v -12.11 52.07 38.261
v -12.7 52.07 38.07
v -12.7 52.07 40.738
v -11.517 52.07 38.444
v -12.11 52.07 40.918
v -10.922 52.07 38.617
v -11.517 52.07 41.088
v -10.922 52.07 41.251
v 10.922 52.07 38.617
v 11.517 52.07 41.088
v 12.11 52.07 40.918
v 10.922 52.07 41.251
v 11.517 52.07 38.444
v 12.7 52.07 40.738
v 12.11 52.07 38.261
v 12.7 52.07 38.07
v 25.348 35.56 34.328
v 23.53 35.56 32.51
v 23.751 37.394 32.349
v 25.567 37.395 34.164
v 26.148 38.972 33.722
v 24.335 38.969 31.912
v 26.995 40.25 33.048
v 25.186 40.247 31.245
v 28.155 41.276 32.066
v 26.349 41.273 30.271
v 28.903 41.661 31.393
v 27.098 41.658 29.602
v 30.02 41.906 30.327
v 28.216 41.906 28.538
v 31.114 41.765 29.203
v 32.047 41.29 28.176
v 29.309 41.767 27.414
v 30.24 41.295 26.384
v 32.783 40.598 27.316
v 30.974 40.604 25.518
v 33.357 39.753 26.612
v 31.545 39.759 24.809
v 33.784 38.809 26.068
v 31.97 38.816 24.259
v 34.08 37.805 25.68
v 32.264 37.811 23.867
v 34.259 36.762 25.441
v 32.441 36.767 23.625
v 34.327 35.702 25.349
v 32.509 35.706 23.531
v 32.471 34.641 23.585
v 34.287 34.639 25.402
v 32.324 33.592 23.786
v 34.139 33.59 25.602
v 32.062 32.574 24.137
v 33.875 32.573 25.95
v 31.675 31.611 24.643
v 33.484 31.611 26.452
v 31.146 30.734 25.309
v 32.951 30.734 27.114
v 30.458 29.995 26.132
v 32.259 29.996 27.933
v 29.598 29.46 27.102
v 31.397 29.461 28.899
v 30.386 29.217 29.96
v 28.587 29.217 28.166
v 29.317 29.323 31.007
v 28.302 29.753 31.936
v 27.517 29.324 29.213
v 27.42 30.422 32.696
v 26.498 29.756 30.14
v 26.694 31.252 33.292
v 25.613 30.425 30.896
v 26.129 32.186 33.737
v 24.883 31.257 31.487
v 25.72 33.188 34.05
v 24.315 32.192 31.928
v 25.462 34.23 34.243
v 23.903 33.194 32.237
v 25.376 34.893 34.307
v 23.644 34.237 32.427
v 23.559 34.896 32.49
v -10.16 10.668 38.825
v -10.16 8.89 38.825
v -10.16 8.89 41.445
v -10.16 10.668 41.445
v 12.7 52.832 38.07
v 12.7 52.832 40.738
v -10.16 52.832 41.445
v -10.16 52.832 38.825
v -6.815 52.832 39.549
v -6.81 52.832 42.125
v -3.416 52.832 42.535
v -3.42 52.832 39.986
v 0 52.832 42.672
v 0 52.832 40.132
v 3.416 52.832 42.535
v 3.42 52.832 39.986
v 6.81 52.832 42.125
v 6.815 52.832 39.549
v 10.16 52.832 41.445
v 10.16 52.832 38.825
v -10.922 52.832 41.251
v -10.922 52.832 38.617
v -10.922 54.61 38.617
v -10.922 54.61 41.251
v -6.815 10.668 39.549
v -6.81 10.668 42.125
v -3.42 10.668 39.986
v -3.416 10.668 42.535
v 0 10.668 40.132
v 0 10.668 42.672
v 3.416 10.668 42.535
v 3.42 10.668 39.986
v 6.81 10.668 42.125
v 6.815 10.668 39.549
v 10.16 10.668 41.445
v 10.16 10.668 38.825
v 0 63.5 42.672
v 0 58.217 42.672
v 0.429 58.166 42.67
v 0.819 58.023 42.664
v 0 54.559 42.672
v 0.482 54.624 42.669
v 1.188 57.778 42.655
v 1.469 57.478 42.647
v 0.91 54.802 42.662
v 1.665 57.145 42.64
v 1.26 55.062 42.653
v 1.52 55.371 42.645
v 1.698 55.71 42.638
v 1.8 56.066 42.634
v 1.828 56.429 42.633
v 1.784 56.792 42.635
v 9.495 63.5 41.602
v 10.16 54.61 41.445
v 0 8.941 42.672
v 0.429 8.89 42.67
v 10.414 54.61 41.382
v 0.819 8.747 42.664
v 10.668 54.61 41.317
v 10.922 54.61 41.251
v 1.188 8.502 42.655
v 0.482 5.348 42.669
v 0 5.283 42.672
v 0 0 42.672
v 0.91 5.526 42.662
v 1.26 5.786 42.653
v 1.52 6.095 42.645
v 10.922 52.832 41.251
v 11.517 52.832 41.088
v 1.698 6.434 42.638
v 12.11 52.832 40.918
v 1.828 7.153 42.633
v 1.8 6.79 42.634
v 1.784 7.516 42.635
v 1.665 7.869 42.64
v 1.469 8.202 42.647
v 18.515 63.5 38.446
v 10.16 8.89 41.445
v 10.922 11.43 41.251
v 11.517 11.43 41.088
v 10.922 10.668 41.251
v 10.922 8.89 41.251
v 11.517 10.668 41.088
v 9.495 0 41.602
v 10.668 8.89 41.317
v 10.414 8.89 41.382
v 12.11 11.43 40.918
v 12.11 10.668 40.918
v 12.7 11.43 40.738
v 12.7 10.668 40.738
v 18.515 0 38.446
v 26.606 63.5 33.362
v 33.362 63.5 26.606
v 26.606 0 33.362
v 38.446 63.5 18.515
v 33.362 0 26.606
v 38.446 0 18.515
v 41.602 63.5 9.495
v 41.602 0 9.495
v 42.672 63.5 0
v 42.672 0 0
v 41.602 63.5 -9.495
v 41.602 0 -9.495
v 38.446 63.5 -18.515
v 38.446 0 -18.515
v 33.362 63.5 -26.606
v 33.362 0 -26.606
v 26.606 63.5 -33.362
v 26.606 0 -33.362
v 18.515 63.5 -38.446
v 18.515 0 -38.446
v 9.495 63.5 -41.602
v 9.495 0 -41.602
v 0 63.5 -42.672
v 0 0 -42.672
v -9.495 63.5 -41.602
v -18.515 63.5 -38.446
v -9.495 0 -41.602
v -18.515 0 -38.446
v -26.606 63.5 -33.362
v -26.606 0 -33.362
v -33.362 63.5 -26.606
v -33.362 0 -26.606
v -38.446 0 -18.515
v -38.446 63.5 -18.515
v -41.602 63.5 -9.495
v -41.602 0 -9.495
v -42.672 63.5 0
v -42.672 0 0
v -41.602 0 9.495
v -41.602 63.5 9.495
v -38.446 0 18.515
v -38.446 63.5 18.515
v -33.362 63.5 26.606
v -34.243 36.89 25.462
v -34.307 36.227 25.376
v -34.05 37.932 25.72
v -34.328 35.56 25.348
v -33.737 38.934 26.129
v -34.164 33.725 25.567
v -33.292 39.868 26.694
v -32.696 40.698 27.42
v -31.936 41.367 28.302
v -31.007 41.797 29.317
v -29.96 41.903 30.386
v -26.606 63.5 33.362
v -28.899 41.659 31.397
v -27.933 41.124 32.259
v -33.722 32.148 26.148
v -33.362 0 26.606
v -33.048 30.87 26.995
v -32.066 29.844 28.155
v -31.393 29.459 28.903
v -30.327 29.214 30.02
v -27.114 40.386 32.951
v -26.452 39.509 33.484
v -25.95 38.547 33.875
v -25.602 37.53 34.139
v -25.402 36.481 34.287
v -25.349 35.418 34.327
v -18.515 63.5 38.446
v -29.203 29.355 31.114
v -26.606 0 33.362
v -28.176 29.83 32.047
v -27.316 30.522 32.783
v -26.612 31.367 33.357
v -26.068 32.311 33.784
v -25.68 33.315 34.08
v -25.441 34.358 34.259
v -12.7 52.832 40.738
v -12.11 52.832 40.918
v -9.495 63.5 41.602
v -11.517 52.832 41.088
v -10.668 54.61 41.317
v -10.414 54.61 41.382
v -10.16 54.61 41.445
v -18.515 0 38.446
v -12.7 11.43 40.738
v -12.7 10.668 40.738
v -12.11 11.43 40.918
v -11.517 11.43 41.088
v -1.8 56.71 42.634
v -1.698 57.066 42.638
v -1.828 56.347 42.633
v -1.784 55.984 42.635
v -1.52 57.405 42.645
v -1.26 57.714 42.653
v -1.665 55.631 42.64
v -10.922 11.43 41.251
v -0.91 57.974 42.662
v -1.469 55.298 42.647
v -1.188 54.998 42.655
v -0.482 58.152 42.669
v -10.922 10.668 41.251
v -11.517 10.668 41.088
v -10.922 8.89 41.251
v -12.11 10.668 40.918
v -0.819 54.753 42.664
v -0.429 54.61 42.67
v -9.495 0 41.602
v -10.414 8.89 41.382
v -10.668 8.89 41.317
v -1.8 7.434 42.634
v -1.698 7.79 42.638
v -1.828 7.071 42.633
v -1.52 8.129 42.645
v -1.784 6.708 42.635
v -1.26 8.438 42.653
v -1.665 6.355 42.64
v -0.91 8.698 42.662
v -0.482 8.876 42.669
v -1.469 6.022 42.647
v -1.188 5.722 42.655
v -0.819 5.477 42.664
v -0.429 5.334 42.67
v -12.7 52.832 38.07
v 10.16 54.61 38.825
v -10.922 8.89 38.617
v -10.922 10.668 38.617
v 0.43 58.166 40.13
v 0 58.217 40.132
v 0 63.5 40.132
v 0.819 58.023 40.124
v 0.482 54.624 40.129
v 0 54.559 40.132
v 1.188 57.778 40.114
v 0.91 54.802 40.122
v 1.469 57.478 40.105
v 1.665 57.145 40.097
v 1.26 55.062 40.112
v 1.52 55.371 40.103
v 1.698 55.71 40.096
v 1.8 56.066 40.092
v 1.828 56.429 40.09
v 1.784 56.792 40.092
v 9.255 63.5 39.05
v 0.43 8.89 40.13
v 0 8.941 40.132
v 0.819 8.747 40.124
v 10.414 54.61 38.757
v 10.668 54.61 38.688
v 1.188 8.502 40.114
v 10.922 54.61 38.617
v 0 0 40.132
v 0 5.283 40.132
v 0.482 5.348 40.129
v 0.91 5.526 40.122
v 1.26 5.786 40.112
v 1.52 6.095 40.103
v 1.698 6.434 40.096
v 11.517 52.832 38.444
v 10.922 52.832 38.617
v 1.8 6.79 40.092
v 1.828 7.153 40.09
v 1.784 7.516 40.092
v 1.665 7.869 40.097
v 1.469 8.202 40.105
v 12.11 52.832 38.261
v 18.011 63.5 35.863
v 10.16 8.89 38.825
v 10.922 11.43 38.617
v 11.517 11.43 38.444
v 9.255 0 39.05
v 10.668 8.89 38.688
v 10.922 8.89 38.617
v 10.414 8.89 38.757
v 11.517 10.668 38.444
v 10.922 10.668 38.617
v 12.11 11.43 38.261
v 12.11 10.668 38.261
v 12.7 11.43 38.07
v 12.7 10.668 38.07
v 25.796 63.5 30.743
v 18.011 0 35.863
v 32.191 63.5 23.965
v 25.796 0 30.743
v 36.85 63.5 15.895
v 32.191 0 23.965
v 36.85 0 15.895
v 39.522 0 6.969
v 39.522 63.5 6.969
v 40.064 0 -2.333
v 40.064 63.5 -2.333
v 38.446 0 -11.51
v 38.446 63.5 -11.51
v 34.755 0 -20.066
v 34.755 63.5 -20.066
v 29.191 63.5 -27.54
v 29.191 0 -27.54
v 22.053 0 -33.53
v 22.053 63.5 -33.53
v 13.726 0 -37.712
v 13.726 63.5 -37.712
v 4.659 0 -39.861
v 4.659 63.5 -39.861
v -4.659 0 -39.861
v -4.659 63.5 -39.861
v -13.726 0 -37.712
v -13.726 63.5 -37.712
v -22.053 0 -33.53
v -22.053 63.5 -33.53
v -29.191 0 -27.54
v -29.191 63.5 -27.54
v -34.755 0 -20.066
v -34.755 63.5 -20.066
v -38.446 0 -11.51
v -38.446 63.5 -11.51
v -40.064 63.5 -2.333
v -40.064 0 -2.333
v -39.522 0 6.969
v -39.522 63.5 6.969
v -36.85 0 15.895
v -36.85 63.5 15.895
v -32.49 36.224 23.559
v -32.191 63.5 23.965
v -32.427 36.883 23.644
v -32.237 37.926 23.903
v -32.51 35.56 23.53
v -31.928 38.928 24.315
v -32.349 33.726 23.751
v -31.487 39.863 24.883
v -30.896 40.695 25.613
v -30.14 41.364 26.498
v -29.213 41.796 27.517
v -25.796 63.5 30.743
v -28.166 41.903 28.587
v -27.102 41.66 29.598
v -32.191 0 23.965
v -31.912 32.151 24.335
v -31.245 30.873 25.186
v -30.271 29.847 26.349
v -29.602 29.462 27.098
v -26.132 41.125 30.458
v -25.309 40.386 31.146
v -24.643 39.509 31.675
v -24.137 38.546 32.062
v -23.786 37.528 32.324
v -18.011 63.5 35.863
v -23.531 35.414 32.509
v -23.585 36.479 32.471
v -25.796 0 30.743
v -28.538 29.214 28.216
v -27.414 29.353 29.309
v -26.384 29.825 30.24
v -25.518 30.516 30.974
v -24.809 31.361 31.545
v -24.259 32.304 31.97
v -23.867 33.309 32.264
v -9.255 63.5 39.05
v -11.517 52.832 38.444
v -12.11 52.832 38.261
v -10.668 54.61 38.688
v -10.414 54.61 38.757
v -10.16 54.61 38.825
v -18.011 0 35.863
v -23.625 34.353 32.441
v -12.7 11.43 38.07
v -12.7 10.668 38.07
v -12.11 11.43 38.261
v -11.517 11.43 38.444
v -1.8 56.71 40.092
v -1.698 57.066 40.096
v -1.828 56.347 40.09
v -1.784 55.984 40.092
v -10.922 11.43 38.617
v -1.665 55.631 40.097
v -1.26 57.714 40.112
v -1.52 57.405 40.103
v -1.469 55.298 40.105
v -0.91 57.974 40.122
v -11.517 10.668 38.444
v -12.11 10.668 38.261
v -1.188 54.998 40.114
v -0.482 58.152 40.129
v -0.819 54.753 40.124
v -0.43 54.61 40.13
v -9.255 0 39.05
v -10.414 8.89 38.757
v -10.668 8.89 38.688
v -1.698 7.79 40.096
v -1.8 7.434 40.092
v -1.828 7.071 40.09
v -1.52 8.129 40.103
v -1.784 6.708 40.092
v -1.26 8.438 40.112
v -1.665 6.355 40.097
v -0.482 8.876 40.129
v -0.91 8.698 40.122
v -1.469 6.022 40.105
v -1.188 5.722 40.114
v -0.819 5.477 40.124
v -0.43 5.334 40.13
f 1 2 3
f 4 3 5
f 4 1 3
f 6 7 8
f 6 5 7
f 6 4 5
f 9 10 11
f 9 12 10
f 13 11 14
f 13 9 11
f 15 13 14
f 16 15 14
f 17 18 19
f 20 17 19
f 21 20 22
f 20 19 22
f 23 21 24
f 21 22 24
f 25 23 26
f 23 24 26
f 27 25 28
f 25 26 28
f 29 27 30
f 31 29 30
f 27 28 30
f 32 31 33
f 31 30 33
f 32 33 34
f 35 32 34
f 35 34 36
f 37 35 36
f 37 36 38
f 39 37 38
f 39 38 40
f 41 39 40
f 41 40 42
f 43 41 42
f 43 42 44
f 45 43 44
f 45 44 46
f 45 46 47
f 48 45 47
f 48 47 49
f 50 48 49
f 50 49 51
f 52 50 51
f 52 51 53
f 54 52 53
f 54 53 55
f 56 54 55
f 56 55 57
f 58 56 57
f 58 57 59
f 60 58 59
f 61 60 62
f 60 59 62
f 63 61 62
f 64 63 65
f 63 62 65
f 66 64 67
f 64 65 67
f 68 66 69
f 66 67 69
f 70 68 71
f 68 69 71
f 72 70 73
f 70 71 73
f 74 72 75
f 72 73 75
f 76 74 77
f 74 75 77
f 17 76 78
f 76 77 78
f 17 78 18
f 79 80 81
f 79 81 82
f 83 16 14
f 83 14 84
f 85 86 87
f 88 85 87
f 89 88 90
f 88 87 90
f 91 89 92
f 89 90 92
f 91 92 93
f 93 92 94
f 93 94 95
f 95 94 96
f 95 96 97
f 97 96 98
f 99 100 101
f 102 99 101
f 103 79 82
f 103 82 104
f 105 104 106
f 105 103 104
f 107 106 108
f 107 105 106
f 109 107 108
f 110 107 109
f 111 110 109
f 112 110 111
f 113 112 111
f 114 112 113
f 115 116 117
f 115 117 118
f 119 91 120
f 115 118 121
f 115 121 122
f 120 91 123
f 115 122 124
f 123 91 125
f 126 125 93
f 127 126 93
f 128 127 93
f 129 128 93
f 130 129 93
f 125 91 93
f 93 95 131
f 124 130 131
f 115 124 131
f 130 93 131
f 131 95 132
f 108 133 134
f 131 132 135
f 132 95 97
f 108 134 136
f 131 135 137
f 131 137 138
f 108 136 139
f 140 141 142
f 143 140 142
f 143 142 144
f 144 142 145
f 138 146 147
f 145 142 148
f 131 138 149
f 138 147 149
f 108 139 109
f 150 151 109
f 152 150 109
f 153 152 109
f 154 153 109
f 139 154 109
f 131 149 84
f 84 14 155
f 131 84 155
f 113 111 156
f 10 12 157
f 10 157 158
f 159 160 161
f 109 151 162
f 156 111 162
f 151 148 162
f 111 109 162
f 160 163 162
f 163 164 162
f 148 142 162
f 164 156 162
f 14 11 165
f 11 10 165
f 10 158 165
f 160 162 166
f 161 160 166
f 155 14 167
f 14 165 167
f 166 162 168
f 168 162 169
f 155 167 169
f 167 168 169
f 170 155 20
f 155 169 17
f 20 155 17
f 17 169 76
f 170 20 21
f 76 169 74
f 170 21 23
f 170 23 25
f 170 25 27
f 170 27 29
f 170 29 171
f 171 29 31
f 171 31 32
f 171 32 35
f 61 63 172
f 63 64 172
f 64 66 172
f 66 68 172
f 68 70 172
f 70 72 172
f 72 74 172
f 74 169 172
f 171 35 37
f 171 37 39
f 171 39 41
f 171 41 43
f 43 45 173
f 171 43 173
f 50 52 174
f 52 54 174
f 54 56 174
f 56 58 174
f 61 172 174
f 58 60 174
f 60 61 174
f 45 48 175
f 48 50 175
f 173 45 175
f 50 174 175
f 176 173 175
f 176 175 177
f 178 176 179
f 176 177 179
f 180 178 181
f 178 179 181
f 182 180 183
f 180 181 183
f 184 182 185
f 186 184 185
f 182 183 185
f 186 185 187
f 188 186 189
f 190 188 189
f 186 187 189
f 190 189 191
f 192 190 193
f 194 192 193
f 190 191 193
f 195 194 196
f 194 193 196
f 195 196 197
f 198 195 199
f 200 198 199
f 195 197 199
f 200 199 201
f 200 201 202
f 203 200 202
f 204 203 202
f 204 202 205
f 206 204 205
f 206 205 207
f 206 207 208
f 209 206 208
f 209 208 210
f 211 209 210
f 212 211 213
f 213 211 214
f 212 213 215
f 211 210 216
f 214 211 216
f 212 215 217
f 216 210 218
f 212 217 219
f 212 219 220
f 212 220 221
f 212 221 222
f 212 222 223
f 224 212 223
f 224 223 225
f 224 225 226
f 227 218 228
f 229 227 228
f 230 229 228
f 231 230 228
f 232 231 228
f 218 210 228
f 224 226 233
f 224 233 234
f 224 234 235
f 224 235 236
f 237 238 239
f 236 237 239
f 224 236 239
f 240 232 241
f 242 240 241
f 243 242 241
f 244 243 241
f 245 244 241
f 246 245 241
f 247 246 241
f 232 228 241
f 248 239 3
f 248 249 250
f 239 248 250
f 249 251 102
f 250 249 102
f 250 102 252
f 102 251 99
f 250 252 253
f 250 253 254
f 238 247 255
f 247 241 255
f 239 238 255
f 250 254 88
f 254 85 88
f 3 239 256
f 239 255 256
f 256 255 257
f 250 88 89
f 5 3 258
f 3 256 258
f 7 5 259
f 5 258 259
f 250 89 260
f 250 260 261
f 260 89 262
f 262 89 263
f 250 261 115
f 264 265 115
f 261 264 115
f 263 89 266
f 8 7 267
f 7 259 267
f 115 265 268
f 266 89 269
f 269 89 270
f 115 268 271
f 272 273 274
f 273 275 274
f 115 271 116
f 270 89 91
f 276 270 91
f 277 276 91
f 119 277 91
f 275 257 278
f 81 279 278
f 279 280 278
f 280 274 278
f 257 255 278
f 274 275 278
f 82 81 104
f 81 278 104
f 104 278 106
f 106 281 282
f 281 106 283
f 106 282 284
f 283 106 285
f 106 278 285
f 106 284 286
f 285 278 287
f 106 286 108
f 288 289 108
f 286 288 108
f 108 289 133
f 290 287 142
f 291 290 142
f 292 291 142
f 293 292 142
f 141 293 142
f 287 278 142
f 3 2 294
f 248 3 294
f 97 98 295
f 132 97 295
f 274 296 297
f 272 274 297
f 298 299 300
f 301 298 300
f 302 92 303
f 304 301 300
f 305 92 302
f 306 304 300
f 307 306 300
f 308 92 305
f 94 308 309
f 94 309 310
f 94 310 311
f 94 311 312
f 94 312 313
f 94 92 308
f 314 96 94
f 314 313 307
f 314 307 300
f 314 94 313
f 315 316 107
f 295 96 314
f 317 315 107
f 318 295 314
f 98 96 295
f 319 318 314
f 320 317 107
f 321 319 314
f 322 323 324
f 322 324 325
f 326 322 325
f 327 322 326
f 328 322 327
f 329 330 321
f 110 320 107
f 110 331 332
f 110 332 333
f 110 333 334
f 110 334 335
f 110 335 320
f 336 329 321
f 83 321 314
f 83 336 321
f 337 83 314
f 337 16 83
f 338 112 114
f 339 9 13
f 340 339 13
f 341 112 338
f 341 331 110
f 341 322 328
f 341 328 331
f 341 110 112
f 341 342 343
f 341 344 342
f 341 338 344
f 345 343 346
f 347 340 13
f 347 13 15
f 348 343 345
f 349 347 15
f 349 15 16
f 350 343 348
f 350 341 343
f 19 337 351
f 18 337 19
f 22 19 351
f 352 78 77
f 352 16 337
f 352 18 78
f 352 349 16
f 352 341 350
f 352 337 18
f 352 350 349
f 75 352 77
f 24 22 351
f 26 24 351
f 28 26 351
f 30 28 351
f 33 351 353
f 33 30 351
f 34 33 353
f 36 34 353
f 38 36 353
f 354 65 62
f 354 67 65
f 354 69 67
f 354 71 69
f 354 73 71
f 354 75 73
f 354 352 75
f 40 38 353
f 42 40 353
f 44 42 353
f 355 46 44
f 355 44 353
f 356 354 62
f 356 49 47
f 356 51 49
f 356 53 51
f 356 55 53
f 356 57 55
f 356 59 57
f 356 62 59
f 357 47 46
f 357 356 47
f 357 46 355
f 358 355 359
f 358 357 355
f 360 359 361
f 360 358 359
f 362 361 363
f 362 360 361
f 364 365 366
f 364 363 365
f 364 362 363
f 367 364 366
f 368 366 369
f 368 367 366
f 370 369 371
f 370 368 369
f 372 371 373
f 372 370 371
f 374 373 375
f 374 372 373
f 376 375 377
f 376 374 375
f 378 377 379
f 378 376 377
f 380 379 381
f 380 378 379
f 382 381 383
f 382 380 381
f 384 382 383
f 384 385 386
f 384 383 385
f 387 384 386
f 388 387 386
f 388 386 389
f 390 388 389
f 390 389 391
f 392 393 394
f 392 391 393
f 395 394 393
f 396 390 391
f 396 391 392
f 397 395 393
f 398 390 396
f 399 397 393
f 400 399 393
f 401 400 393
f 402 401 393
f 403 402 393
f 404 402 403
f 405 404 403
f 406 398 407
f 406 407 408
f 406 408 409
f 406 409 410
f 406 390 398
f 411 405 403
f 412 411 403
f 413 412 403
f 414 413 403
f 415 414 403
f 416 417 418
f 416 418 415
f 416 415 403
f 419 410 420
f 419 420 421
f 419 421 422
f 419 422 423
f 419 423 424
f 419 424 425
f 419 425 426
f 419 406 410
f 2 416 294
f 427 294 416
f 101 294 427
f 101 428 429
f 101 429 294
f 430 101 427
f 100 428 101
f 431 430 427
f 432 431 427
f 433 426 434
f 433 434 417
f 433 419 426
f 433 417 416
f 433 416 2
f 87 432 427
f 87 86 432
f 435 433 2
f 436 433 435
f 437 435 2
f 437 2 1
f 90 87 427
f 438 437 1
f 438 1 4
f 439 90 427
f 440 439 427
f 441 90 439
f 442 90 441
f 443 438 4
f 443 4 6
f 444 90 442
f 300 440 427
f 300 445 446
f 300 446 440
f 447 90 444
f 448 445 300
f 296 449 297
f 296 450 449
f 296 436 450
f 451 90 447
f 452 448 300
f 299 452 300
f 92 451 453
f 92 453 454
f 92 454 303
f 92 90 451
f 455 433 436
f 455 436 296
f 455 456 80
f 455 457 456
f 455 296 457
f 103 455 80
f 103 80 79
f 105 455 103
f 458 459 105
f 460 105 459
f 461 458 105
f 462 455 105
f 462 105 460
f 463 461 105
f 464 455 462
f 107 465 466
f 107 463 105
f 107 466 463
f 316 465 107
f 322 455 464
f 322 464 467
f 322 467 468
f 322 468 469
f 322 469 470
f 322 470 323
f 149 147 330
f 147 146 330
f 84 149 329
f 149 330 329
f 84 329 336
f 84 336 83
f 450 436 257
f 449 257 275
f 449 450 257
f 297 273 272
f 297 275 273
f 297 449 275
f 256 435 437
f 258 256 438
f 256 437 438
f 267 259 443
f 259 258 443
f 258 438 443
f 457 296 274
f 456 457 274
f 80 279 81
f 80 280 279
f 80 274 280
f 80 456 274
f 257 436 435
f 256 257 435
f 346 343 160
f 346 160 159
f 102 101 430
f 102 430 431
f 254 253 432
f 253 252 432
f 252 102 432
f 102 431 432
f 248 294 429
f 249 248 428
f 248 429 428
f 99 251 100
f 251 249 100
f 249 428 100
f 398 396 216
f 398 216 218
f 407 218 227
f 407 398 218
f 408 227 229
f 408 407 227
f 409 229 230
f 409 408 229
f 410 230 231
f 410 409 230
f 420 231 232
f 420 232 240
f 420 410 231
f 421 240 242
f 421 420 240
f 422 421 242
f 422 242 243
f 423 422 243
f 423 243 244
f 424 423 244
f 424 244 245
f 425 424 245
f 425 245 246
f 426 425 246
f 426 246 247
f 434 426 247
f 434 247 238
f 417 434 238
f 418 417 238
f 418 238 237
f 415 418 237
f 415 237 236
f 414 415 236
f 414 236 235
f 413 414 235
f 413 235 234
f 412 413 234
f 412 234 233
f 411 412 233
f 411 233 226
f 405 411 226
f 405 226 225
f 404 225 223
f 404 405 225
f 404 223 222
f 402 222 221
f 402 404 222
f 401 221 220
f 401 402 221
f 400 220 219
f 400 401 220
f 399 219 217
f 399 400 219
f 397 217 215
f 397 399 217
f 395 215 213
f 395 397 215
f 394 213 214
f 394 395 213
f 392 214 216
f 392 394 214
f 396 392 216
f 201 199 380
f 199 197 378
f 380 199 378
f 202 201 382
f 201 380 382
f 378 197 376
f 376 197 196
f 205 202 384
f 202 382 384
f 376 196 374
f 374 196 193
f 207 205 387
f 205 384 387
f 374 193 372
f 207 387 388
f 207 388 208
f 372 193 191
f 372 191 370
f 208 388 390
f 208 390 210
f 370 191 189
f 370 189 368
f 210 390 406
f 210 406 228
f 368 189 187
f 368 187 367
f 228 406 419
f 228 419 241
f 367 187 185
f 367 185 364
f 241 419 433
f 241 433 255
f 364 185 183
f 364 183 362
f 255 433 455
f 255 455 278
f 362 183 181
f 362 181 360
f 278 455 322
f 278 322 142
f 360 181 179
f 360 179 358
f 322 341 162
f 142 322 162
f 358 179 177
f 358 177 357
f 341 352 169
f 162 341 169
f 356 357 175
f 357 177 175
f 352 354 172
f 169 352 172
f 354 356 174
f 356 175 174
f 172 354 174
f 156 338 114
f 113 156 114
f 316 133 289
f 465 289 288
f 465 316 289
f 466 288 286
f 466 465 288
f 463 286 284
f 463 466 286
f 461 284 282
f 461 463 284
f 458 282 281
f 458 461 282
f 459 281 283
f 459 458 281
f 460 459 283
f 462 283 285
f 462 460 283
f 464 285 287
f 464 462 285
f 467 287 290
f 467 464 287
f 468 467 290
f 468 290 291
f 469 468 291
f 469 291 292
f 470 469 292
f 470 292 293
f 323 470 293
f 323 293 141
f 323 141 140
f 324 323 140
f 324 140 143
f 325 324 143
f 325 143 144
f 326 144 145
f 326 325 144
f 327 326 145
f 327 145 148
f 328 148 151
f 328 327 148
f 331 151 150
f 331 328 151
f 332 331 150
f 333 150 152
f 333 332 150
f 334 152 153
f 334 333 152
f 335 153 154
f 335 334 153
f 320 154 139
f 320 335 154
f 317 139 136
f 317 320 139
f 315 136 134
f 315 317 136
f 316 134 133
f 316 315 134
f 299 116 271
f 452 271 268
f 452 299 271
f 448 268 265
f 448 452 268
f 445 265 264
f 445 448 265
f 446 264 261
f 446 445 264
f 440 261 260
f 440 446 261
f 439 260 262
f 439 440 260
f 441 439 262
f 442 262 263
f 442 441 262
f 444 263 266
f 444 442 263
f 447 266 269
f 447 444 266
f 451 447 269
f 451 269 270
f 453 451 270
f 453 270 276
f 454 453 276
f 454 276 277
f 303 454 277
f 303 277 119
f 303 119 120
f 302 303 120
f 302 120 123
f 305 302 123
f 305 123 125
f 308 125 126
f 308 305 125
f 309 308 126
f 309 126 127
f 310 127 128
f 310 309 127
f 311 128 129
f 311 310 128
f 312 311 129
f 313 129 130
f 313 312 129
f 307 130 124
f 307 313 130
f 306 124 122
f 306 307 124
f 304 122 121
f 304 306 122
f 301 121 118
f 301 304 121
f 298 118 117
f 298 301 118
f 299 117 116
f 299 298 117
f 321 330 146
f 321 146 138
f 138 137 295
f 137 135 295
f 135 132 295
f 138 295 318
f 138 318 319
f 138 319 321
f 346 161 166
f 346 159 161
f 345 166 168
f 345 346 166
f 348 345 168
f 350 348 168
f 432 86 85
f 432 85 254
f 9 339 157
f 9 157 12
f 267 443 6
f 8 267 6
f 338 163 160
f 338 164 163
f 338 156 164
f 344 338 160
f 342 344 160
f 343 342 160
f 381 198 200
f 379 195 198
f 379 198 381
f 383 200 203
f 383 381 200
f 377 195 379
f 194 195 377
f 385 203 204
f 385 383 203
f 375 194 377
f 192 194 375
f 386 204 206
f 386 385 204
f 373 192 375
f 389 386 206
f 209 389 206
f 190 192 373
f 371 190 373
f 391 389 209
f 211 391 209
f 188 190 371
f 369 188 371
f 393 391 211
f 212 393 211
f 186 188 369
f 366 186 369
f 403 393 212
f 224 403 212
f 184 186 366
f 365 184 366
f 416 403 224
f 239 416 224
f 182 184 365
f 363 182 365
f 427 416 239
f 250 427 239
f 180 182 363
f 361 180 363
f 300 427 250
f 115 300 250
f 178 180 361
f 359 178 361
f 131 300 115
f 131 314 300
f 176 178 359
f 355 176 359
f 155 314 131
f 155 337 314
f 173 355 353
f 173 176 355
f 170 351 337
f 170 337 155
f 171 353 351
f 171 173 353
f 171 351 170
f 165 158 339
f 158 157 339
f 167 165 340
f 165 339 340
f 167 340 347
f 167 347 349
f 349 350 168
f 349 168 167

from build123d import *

# Parameters (mm, degrees)
SKETCH1_R           = 42.672
BOSS_EXTRUDE1_DEPTH = 63.5
SKETCH2_R           = 40.132
CUT_EXTRUDE1_DEPTH  = 88.601650487
SKETCH3_R           = 1.8288
CUT_EXTRUDE2_DEPTH  = 88.601650487
SKETCH4_R           = 6.35
CUT_EXTRUDE3_DEPTH  = 88.601650665
SKETCH5_R           = 6.35
CUT_EXTRUDE4_DEPTH  = 88.601650665


with BuildPart() as part:
    # Sketch1 → Boss-Extrude1 (new body)
    with BuildSketch(Plane(origin=(0, 0, 0), x_dir=(1, 0, 0), z_dir=(0, 1, 0))):
        Circle(SKETCH1_R)
    extrude(amount=BOSS_EXTRUDE1_DEPTH)

    # Sketch2 → Cut-Extrude1 (cut, through all)
    with BuildSketch(Plane(origin=(0, 0, 0), x_dir=(1, 0, 0), z_dir=(0, 1, 0))):
        Circle(SKETCH2_R)
    extrude(amount=CUT_EXTRUDE1_DEPTH, mode=Mode.SUBTRACT)

    # Sketch3 → Cut-Extrude2 (cut, through all)
    with BuildSketch(Plane.XY):
        Polygon((-12.7, 52.832), (-12.7, 52.07), (-10.922, 52.07), (-10.922, 11.43), (-12.7, 11.43), (-12.7, 10.668), (-10.922, 10.668), (-10.922, 8.89), (-10.16, 8.89), (-10.16, 10.668), (10.16, 10.668), (10.16, 8.89), (10.922, 8.89), (10.922, 10.668), (12.7, 10.668), (12.7, 11.43), (10.922, 11.43), (10.922, 52.07), (12.7, 52.07), (12.7, 52.832), (10.922, 52.832), (10.922, 54.61), (10.16, 54.61), (10.16, 52.832), (-10.16, 52.832), (-10.16, 54.61), (-10.922, 54.61), (-10.922, 52.832), align=None)
        with Locations((0, 56.388)):
            Circle(SKETCH3_R)
        with Locations((0, 7.112)):
            Circle(SKETCH3_R)
    extrude(amount=CUT_EXTRUDE2_DEPTH, mode=Mode.SUBTRACT)

    # Sketch4 → Cut-Extrude3 (cut, through all)
    with BuildSketch(Plane(origin=(0, 0, 0), x_dir=(0, -1, 0), z_dir=(-0.7071067811865488, 0, 0.7071067811865464))):
        with Locations((-35.56, 0)):
            Circle(SKETCH4_R)
    extrude(amount=CUT_EXTRUDE3_DEPTH, mode=Mode.SUBTRACT)

    # Sketch5 → Cut-Extrude4 (cut, through all)
    with BuildSketch(Plane(origin=(0, 0, 0), x_dir=(0, -1, 0), z_dir=(-0.7071067811865464, 0, -0.7071067811865488))):
        with Locations((-35.56, 0)):
            Circle(SKETCH5_R)
    extrude(amount=-CUT_EXTRUDE4_DEPTH, mode=Mode.SUBTRACT)


solid = part.part
